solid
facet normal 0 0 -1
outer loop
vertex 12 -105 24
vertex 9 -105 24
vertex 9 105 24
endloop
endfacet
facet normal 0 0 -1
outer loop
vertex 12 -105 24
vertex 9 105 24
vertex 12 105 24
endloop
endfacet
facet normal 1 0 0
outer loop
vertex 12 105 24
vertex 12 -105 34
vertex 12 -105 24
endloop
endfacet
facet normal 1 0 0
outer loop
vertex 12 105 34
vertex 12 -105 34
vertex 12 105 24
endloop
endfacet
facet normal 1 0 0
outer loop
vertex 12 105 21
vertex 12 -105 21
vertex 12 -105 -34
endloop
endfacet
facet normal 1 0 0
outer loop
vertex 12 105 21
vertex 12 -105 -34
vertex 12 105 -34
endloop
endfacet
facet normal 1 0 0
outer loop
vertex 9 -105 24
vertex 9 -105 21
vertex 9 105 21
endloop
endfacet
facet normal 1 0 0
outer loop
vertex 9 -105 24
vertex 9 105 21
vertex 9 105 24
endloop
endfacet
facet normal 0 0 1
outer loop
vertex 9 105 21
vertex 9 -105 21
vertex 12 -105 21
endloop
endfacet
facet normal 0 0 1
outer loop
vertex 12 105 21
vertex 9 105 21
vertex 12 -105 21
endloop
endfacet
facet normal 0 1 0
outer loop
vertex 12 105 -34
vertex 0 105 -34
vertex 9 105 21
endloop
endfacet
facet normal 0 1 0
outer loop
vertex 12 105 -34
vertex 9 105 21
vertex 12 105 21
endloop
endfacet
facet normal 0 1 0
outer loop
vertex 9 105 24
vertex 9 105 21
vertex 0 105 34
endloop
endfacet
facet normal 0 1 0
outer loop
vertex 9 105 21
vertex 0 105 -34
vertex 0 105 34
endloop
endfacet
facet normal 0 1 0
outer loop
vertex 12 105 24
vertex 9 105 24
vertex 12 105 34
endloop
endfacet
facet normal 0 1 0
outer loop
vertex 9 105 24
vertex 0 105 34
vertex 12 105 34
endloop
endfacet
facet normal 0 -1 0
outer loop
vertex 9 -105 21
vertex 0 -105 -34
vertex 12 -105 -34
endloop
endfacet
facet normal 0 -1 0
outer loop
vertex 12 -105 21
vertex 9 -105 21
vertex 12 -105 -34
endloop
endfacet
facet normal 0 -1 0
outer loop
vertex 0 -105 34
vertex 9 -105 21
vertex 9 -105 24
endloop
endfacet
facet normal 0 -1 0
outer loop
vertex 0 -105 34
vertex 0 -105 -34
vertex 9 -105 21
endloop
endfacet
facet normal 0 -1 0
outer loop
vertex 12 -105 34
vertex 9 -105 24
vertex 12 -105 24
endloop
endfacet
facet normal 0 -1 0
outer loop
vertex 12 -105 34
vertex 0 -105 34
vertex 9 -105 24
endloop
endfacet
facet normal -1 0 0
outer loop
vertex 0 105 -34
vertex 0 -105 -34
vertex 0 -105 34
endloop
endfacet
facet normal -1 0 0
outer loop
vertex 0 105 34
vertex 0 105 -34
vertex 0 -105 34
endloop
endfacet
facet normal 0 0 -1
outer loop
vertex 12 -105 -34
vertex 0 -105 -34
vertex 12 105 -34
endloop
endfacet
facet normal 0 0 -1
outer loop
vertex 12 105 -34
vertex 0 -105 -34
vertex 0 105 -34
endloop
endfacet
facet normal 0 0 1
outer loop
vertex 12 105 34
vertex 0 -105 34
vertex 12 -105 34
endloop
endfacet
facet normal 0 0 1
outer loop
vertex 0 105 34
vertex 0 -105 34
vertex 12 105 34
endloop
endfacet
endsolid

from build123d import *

# Parameters (mm, degrees)
F0_W     = 210
F0_H     = 68
F1_DEPTH = 12
F2_W     = 3
F2_H     = 3
F3_DEPTH = 222000
F4_W     = 3
F4_H     = 3
F5_DEPTH = 210
F6_W     = 3
F6_H     = 3
F7_DEPTH = 300


with BuildPart() as f1:
    # F0 (on Right) → F1 (new body)
    with BuildSketch(Plane.YZ):
        Rectangle(F0_W, F0_H)
    extrude(amount=F1_DEPTH)

    # F2 (on face) → F3 (cut)
    with BuildSketch(Plane.XZ.offset(105)):
        with Locations((1.5, 22.5)):
            Rectangle(F2_W, F2_H)
    extrude(amount=-F3_DEPTH, mode=Mode.SUBTRACT)

    # F4 (on face) → F5 (join)
    with BuildSketch(Plane.XZ.offset(105)):
        with Locations((1.5, 22.5)):
            Rectangle(F4_W, F4_H)
    extrude(amount=-F5_DEPTH)

    # F6 (on face) → F7 (cut)
    with BuildSketch(Plane.XZ.offset(105)):
        with Locations((10.5, 22.5)):
            Rectangle(F6_W, F6_H)
    extrude(amount=-F7_DEPTH, mode=Mode.SUBTRACT)


solid = f1.part
